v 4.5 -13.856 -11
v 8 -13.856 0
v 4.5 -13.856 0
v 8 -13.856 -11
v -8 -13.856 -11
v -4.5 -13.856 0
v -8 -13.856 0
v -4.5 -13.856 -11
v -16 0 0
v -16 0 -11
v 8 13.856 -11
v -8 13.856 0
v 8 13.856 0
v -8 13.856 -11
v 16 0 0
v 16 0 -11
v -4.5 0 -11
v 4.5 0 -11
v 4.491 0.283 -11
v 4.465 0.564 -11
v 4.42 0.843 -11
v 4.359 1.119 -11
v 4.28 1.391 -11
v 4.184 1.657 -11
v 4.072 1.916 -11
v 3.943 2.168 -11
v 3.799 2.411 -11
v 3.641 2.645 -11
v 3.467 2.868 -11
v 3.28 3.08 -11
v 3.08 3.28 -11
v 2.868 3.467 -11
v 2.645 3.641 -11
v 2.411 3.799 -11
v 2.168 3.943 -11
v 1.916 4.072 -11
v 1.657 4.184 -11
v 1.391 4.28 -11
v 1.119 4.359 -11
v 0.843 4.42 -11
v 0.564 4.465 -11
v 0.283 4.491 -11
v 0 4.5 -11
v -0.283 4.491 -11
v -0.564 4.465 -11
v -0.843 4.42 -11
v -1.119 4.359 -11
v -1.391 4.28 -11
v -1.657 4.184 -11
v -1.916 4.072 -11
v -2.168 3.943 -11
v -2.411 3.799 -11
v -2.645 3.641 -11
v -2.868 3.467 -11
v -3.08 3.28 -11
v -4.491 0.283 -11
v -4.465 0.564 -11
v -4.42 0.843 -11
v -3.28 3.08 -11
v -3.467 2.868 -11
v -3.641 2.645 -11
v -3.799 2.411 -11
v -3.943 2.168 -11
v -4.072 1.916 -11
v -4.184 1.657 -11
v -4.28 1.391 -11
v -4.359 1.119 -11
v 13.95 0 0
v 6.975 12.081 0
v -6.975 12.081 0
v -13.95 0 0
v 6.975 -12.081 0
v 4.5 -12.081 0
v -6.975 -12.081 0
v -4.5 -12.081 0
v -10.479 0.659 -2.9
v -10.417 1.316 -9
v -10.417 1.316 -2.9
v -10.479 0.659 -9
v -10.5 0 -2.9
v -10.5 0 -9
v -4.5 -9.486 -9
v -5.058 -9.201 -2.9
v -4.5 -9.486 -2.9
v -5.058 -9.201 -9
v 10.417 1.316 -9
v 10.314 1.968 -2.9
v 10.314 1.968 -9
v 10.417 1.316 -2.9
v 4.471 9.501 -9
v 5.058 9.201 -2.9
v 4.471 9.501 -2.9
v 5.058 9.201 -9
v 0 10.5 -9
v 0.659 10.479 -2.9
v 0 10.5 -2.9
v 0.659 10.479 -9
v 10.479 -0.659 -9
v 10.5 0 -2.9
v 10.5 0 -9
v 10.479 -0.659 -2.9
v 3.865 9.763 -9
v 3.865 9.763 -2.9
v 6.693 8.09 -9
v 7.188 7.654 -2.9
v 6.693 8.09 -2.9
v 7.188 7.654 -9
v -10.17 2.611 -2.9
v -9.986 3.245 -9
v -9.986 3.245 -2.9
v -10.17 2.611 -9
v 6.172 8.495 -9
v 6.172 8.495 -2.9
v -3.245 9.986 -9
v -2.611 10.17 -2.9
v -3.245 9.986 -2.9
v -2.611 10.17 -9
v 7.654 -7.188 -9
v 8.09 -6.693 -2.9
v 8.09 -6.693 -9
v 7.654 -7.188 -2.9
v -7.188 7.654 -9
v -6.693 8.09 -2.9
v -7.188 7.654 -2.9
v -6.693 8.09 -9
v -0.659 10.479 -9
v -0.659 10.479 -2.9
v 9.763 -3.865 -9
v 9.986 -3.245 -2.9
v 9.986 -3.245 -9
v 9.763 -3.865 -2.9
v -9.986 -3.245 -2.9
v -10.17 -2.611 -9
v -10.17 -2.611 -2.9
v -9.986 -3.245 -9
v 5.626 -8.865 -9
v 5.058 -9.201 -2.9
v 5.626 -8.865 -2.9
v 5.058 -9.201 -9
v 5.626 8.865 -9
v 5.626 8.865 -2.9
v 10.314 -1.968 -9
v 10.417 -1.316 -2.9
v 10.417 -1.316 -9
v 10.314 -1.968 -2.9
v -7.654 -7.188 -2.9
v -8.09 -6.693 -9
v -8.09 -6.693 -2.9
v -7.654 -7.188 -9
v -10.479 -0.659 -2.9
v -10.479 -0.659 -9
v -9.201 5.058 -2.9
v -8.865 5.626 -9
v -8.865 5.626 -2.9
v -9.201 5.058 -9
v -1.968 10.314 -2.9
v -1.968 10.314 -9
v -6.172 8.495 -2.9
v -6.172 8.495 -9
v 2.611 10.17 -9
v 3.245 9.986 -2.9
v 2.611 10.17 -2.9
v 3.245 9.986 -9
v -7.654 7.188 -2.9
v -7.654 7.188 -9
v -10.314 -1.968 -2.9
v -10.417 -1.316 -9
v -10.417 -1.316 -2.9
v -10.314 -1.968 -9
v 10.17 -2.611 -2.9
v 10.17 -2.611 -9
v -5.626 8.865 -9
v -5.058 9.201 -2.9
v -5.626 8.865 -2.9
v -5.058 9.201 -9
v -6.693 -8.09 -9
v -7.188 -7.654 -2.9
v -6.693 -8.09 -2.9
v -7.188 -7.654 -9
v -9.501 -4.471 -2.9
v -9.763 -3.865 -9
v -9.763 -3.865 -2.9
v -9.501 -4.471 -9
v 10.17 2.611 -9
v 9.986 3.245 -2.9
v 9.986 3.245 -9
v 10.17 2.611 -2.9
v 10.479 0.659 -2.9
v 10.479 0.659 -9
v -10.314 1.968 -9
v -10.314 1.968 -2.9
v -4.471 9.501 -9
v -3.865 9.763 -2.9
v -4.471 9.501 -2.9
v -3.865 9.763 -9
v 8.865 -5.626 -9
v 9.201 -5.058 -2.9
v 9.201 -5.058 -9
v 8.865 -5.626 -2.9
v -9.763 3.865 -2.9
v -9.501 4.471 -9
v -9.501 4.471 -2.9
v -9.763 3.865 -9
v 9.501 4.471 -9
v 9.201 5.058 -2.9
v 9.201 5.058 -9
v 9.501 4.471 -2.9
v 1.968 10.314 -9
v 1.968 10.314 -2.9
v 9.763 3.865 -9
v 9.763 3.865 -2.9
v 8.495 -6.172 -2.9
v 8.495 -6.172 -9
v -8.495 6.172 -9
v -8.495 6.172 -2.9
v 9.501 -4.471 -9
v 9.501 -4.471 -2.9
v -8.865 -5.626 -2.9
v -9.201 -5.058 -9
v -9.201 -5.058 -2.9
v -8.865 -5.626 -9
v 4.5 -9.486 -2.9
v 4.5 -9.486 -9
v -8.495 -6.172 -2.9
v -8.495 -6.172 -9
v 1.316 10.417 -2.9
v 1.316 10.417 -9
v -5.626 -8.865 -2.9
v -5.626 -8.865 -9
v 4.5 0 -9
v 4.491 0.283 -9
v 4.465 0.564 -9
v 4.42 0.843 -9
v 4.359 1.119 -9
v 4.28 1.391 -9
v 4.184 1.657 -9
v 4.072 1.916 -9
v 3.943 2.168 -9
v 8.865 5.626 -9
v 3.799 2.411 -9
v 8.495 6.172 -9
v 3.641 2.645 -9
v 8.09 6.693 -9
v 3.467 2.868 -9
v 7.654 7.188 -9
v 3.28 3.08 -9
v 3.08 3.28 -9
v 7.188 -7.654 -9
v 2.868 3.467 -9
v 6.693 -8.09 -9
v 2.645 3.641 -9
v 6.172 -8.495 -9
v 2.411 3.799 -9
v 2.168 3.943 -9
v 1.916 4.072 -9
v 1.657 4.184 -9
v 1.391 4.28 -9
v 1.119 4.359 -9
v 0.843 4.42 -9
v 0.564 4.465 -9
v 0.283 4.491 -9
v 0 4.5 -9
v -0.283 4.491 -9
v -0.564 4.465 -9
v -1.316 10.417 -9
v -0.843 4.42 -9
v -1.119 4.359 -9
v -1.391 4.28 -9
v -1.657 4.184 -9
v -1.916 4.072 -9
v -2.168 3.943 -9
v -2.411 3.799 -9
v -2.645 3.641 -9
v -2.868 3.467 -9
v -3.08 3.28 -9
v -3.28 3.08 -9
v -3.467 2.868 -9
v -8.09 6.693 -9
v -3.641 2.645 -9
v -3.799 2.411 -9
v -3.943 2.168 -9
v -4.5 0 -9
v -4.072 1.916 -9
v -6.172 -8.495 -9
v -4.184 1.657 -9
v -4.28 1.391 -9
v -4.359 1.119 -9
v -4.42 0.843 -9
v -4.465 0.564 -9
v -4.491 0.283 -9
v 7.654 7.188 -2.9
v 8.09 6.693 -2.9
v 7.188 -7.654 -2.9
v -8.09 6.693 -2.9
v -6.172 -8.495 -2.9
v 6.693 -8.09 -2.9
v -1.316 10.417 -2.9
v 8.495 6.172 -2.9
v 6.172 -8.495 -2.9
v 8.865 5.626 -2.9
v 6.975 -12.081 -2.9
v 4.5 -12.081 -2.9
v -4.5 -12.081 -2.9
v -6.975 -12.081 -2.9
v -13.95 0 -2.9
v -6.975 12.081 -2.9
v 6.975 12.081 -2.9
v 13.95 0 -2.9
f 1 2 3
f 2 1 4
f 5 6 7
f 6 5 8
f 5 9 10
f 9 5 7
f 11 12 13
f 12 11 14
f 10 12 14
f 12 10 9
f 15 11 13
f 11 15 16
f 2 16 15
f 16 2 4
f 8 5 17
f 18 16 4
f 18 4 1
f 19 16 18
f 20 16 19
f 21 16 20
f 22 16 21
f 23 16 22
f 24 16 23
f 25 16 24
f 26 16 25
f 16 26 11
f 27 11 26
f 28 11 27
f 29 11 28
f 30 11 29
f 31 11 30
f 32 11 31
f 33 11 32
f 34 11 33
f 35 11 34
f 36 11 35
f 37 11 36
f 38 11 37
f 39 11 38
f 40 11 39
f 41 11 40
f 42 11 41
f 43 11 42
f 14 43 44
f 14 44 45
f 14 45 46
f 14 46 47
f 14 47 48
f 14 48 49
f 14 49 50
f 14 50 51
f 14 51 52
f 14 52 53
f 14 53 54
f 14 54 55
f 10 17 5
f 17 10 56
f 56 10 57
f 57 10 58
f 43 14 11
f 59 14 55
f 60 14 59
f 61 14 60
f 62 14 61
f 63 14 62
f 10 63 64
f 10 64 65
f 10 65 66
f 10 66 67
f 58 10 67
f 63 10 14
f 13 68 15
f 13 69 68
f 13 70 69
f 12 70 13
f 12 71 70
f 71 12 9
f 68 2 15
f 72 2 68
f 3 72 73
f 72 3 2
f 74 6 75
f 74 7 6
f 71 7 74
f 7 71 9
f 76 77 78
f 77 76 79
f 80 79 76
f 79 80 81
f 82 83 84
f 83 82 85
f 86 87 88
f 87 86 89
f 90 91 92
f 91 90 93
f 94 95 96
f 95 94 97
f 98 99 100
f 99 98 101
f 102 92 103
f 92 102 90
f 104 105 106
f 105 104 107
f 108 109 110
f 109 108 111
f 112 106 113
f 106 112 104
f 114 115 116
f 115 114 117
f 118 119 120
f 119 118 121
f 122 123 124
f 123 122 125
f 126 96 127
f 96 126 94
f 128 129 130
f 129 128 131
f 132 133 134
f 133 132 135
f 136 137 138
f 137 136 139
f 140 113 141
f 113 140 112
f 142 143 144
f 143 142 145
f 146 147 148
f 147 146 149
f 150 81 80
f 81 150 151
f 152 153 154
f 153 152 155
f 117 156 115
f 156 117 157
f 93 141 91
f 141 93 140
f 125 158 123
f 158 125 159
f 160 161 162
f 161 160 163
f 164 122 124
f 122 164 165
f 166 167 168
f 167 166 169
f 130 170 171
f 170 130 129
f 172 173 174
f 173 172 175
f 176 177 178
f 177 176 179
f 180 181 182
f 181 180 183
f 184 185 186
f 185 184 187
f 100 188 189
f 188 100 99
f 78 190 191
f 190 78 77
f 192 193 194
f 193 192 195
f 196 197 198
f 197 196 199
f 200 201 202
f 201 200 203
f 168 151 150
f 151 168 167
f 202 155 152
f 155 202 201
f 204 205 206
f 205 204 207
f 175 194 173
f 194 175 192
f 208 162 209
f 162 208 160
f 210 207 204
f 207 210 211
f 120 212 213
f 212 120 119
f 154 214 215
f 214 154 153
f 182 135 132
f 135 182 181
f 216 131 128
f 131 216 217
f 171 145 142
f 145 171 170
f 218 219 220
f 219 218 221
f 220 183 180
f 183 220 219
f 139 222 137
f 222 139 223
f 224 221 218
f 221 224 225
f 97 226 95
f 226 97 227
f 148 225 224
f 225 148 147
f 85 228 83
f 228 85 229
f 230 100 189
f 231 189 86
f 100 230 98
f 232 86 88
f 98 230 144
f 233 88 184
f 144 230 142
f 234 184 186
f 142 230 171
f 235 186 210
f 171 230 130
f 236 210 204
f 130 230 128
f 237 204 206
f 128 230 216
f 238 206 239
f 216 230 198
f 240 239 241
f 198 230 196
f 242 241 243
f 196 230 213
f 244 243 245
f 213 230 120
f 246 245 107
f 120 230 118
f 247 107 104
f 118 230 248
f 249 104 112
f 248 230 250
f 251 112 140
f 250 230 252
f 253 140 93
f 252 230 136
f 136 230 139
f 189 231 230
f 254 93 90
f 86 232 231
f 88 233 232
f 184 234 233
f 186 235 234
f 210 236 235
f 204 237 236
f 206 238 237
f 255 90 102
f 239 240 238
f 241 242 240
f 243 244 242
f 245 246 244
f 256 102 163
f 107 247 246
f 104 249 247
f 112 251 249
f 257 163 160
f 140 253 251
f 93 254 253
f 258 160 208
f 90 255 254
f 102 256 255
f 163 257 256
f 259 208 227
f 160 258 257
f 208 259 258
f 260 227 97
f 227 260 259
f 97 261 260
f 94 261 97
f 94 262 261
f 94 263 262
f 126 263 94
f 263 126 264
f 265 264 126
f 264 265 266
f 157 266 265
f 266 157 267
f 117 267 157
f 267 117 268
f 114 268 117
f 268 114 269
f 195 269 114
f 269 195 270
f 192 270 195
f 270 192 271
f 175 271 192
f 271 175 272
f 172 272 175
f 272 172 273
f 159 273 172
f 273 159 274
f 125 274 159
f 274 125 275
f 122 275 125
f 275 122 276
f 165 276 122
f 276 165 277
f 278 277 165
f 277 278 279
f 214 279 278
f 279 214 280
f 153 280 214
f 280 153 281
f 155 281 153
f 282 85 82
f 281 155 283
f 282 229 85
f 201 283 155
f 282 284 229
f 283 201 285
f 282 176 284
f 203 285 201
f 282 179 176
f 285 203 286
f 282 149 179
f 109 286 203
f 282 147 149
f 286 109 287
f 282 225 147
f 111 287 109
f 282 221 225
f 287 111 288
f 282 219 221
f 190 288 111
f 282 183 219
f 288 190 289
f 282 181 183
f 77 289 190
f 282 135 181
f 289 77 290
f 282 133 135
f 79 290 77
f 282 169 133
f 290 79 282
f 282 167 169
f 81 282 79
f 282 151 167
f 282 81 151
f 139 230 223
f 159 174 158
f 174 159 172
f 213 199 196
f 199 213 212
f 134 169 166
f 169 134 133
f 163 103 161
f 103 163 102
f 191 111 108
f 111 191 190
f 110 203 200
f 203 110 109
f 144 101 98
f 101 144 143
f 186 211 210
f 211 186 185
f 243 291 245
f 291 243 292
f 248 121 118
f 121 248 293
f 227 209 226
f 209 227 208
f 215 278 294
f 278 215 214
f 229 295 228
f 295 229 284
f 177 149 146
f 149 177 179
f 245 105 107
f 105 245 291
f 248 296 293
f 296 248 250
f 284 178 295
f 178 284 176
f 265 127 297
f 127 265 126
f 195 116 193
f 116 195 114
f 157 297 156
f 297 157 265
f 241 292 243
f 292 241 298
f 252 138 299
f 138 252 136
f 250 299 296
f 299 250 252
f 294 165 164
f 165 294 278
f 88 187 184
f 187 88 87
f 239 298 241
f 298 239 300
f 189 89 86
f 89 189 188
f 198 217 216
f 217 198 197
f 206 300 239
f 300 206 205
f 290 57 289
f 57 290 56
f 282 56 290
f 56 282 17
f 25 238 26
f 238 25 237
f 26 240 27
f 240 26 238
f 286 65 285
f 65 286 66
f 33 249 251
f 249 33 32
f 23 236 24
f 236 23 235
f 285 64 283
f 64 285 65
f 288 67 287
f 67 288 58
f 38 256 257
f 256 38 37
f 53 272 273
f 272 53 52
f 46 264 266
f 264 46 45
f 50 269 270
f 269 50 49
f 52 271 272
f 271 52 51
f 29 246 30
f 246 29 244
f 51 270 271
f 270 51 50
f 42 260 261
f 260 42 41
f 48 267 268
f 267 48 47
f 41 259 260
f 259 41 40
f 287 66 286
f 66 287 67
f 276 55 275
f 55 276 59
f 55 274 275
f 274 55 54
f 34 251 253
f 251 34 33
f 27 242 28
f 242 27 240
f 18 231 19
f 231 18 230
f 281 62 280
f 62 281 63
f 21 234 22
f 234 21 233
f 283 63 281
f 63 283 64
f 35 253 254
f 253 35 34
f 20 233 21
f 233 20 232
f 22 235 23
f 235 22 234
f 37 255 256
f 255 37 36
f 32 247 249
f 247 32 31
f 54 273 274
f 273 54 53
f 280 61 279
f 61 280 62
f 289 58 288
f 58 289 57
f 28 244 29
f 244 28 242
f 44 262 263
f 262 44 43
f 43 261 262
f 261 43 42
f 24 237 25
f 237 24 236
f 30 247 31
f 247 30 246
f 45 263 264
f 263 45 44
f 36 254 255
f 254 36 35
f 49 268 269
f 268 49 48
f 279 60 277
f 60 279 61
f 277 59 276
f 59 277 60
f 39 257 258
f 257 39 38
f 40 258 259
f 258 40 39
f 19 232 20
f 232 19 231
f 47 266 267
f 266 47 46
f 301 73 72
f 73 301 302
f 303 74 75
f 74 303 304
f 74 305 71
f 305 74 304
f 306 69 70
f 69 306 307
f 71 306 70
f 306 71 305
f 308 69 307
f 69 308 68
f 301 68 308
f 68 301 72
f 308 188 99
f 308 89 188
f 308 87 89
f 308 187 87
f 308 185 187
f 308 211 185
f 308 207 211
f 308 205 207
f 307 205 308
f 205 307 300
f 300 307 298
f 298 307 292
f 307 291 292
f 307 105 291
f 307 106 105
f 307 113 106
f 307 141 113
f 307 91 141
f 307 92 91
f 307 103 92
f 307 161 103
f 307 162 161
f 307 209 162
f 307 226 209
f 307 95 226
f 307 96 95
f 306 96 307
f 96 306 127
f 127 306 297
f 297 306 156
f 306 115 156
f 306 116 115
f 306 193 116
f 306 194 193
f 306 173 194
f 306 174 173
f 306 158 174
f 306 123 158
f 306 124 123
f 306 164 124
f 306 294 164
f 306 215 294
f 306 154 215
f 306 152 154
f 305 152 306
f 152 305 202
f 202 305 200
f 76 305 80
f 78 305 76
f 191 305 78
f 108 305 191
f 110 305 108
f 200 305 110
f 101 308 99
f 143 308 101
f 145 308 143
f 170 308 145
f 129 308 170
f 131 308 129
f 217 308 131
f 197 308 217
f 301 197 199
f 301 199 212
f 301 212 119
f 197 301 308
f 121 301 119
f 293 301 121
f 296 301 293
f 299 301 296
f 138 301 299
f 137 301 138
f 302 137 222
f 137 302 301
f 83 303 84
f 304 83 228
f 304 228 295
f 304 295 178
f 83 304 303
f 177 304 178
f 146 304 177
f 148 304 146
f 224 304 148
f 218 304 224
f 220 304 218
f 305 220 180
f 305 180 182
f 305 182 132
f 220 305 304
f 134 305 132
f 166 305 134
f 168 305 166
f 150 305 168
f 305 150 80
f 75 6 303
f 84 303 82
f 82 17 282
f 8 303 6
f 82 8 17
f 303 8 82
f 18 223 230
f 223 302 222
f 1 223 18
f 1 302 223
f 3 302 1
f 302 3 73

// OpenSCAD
$fn = 100;
meh = .1;
h = 3;

rotate([0, 180, 0]) difference() {
    cylinder($fn=6, r=16, h=h+8);
    translate([0,  0,  -meh]) cylinder(d=21,h=9+meh);
    translate([0,  0,-1-meh]) cylinder(d=9, h=21+meh);
    translate([0,  0,  -meh]) cylinder($fn=6, r=13.95, h=h);
    translate([0,-15, 0    ]) cube([9,30,50], center=true);
}
